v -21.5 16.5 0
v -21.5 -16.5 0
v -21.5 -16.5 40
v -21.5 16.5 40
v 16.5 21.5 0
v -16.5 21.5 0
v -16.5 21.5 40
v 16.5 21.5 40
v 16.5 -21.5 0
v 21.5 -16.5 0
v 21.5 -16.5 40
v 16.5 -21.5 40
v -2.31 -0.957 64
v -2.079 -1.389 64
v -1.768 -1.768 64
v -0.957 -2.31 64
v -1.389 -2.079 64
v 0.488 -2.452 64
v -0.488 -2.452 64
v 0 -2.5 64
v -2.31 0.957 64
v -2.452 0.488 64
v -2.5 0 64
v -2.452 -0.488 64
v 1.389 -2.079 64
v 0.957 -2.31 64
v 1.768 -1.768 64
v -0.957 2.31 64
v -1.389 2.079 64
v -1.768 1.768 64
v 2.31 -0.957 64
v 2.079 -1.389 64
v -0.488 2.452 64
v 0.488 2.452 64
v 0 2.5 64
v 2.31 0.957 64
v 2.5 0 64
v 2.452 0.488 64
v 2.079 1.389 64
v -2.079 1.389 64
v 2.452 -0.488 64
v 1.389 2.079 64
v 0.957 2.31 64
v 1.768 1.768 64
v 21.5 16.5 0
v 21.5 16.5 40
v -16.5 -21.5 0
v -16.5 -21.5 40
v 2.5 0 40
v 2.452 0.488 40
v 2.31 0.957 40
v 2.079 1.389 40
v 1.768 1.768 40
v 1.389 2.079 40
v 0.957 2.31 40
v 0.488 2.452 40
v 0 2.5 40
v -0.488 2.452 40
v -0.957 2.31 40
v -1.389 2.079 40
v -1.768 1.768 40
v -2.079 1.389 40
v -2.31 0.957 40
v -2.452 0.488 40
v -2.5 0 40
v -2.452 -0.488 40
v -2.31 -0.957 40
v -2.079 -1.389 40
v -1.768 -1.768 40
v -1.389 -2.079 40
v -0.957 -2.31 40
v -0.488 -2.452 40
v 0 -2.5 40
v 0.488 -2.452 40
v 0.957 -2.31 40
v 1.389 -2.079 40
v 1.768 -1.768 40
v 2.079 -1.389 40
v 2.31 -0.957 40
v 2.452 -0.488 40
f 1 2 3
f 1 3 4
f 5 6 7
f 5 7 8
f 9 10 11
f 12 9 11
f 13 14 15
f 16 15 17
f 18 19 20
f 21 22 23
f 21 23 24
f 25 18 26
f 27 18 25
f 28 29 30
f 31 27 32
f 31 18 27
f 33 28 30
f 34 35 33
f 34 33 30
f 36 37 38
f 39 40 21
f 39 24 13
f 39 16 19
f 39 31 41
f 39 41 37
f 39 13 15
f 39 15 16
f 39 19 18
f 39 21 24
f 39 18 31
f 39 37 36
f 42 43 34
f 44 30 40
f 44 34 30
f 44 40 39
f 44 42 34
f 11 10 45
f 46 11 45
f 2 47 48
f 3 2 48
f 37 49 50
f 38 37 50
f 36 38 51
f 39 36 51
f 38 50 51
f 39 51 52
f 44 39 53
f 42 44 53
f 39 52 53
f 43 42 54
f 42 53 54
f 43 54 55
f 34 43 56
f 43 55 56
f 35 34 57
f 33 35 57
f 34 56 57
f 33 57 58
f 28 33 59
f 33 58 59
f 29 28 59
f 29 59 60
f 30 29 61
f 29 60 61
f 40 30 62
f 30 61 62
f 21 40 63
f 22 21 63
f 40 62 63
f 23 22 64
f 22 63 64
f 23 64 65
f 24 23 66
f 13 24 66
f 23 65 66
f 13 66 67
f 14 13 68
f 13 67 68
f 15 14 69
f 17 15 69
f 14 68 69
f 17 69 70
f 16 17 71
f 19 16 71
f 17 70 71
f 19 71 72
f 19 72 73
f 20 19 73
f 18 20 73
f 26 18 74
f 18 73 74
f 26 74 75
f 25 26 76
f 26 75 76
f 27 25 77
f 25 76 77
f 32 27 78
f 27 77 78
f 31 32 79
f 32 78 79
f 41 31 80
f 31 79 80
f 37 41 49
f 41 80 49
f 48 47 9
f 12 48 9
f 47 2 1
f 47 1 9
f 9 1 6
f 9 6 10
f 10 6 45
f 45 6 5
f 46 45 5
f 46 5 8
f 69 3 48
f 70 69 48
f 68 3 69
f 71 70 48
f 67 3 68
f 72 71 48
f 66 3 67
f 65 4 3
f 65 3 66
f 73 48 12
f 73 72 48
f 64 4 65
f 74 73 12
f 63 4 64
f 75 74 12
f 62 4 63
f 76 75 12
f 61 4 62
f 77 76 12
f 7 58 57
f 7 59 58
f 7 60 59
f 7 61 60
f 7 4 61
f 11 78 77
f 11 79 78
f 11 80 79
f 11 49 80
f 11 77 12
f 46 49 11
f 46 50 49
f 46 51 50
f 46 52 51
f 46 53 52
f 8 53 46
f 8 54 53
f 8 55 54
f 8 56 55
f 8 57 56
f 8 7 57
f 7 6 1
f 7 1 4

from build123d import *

# Parameters (mm, degrees)
F0_W     = 43
F0_H     = 43
F1_DEPTH = 40
F2_R     = 2.5
F3_DEPTH = 24
F4_SIZE  = 5


with BuildPart() as f1:
    # F0 (on Top) → F1 (new body)
    with BuildSketch(Plane.XY):
        Rectangle(F0_W, F0_H)
    extrude(amount=F1_DEPTH)

    # F2 (on face) → F3 (join)
    with BuildSketch(Plane.XY.offset(40)):
        Circle(F2_R)
    extrude(amount=F3_DEPTH)

    # F4
    f4_edges = [f1.edges().sort_by_distance(p)[0] for p in [
        (-21.5, -21.5, 20),
        (21.5, -21.5, 20),
        (21.5, 21.5, 20),
        (-21.5, 21.5, 20),
    ]]
    chamfer(f4_edges, length=F4_SIZE)


solid = f1.part
